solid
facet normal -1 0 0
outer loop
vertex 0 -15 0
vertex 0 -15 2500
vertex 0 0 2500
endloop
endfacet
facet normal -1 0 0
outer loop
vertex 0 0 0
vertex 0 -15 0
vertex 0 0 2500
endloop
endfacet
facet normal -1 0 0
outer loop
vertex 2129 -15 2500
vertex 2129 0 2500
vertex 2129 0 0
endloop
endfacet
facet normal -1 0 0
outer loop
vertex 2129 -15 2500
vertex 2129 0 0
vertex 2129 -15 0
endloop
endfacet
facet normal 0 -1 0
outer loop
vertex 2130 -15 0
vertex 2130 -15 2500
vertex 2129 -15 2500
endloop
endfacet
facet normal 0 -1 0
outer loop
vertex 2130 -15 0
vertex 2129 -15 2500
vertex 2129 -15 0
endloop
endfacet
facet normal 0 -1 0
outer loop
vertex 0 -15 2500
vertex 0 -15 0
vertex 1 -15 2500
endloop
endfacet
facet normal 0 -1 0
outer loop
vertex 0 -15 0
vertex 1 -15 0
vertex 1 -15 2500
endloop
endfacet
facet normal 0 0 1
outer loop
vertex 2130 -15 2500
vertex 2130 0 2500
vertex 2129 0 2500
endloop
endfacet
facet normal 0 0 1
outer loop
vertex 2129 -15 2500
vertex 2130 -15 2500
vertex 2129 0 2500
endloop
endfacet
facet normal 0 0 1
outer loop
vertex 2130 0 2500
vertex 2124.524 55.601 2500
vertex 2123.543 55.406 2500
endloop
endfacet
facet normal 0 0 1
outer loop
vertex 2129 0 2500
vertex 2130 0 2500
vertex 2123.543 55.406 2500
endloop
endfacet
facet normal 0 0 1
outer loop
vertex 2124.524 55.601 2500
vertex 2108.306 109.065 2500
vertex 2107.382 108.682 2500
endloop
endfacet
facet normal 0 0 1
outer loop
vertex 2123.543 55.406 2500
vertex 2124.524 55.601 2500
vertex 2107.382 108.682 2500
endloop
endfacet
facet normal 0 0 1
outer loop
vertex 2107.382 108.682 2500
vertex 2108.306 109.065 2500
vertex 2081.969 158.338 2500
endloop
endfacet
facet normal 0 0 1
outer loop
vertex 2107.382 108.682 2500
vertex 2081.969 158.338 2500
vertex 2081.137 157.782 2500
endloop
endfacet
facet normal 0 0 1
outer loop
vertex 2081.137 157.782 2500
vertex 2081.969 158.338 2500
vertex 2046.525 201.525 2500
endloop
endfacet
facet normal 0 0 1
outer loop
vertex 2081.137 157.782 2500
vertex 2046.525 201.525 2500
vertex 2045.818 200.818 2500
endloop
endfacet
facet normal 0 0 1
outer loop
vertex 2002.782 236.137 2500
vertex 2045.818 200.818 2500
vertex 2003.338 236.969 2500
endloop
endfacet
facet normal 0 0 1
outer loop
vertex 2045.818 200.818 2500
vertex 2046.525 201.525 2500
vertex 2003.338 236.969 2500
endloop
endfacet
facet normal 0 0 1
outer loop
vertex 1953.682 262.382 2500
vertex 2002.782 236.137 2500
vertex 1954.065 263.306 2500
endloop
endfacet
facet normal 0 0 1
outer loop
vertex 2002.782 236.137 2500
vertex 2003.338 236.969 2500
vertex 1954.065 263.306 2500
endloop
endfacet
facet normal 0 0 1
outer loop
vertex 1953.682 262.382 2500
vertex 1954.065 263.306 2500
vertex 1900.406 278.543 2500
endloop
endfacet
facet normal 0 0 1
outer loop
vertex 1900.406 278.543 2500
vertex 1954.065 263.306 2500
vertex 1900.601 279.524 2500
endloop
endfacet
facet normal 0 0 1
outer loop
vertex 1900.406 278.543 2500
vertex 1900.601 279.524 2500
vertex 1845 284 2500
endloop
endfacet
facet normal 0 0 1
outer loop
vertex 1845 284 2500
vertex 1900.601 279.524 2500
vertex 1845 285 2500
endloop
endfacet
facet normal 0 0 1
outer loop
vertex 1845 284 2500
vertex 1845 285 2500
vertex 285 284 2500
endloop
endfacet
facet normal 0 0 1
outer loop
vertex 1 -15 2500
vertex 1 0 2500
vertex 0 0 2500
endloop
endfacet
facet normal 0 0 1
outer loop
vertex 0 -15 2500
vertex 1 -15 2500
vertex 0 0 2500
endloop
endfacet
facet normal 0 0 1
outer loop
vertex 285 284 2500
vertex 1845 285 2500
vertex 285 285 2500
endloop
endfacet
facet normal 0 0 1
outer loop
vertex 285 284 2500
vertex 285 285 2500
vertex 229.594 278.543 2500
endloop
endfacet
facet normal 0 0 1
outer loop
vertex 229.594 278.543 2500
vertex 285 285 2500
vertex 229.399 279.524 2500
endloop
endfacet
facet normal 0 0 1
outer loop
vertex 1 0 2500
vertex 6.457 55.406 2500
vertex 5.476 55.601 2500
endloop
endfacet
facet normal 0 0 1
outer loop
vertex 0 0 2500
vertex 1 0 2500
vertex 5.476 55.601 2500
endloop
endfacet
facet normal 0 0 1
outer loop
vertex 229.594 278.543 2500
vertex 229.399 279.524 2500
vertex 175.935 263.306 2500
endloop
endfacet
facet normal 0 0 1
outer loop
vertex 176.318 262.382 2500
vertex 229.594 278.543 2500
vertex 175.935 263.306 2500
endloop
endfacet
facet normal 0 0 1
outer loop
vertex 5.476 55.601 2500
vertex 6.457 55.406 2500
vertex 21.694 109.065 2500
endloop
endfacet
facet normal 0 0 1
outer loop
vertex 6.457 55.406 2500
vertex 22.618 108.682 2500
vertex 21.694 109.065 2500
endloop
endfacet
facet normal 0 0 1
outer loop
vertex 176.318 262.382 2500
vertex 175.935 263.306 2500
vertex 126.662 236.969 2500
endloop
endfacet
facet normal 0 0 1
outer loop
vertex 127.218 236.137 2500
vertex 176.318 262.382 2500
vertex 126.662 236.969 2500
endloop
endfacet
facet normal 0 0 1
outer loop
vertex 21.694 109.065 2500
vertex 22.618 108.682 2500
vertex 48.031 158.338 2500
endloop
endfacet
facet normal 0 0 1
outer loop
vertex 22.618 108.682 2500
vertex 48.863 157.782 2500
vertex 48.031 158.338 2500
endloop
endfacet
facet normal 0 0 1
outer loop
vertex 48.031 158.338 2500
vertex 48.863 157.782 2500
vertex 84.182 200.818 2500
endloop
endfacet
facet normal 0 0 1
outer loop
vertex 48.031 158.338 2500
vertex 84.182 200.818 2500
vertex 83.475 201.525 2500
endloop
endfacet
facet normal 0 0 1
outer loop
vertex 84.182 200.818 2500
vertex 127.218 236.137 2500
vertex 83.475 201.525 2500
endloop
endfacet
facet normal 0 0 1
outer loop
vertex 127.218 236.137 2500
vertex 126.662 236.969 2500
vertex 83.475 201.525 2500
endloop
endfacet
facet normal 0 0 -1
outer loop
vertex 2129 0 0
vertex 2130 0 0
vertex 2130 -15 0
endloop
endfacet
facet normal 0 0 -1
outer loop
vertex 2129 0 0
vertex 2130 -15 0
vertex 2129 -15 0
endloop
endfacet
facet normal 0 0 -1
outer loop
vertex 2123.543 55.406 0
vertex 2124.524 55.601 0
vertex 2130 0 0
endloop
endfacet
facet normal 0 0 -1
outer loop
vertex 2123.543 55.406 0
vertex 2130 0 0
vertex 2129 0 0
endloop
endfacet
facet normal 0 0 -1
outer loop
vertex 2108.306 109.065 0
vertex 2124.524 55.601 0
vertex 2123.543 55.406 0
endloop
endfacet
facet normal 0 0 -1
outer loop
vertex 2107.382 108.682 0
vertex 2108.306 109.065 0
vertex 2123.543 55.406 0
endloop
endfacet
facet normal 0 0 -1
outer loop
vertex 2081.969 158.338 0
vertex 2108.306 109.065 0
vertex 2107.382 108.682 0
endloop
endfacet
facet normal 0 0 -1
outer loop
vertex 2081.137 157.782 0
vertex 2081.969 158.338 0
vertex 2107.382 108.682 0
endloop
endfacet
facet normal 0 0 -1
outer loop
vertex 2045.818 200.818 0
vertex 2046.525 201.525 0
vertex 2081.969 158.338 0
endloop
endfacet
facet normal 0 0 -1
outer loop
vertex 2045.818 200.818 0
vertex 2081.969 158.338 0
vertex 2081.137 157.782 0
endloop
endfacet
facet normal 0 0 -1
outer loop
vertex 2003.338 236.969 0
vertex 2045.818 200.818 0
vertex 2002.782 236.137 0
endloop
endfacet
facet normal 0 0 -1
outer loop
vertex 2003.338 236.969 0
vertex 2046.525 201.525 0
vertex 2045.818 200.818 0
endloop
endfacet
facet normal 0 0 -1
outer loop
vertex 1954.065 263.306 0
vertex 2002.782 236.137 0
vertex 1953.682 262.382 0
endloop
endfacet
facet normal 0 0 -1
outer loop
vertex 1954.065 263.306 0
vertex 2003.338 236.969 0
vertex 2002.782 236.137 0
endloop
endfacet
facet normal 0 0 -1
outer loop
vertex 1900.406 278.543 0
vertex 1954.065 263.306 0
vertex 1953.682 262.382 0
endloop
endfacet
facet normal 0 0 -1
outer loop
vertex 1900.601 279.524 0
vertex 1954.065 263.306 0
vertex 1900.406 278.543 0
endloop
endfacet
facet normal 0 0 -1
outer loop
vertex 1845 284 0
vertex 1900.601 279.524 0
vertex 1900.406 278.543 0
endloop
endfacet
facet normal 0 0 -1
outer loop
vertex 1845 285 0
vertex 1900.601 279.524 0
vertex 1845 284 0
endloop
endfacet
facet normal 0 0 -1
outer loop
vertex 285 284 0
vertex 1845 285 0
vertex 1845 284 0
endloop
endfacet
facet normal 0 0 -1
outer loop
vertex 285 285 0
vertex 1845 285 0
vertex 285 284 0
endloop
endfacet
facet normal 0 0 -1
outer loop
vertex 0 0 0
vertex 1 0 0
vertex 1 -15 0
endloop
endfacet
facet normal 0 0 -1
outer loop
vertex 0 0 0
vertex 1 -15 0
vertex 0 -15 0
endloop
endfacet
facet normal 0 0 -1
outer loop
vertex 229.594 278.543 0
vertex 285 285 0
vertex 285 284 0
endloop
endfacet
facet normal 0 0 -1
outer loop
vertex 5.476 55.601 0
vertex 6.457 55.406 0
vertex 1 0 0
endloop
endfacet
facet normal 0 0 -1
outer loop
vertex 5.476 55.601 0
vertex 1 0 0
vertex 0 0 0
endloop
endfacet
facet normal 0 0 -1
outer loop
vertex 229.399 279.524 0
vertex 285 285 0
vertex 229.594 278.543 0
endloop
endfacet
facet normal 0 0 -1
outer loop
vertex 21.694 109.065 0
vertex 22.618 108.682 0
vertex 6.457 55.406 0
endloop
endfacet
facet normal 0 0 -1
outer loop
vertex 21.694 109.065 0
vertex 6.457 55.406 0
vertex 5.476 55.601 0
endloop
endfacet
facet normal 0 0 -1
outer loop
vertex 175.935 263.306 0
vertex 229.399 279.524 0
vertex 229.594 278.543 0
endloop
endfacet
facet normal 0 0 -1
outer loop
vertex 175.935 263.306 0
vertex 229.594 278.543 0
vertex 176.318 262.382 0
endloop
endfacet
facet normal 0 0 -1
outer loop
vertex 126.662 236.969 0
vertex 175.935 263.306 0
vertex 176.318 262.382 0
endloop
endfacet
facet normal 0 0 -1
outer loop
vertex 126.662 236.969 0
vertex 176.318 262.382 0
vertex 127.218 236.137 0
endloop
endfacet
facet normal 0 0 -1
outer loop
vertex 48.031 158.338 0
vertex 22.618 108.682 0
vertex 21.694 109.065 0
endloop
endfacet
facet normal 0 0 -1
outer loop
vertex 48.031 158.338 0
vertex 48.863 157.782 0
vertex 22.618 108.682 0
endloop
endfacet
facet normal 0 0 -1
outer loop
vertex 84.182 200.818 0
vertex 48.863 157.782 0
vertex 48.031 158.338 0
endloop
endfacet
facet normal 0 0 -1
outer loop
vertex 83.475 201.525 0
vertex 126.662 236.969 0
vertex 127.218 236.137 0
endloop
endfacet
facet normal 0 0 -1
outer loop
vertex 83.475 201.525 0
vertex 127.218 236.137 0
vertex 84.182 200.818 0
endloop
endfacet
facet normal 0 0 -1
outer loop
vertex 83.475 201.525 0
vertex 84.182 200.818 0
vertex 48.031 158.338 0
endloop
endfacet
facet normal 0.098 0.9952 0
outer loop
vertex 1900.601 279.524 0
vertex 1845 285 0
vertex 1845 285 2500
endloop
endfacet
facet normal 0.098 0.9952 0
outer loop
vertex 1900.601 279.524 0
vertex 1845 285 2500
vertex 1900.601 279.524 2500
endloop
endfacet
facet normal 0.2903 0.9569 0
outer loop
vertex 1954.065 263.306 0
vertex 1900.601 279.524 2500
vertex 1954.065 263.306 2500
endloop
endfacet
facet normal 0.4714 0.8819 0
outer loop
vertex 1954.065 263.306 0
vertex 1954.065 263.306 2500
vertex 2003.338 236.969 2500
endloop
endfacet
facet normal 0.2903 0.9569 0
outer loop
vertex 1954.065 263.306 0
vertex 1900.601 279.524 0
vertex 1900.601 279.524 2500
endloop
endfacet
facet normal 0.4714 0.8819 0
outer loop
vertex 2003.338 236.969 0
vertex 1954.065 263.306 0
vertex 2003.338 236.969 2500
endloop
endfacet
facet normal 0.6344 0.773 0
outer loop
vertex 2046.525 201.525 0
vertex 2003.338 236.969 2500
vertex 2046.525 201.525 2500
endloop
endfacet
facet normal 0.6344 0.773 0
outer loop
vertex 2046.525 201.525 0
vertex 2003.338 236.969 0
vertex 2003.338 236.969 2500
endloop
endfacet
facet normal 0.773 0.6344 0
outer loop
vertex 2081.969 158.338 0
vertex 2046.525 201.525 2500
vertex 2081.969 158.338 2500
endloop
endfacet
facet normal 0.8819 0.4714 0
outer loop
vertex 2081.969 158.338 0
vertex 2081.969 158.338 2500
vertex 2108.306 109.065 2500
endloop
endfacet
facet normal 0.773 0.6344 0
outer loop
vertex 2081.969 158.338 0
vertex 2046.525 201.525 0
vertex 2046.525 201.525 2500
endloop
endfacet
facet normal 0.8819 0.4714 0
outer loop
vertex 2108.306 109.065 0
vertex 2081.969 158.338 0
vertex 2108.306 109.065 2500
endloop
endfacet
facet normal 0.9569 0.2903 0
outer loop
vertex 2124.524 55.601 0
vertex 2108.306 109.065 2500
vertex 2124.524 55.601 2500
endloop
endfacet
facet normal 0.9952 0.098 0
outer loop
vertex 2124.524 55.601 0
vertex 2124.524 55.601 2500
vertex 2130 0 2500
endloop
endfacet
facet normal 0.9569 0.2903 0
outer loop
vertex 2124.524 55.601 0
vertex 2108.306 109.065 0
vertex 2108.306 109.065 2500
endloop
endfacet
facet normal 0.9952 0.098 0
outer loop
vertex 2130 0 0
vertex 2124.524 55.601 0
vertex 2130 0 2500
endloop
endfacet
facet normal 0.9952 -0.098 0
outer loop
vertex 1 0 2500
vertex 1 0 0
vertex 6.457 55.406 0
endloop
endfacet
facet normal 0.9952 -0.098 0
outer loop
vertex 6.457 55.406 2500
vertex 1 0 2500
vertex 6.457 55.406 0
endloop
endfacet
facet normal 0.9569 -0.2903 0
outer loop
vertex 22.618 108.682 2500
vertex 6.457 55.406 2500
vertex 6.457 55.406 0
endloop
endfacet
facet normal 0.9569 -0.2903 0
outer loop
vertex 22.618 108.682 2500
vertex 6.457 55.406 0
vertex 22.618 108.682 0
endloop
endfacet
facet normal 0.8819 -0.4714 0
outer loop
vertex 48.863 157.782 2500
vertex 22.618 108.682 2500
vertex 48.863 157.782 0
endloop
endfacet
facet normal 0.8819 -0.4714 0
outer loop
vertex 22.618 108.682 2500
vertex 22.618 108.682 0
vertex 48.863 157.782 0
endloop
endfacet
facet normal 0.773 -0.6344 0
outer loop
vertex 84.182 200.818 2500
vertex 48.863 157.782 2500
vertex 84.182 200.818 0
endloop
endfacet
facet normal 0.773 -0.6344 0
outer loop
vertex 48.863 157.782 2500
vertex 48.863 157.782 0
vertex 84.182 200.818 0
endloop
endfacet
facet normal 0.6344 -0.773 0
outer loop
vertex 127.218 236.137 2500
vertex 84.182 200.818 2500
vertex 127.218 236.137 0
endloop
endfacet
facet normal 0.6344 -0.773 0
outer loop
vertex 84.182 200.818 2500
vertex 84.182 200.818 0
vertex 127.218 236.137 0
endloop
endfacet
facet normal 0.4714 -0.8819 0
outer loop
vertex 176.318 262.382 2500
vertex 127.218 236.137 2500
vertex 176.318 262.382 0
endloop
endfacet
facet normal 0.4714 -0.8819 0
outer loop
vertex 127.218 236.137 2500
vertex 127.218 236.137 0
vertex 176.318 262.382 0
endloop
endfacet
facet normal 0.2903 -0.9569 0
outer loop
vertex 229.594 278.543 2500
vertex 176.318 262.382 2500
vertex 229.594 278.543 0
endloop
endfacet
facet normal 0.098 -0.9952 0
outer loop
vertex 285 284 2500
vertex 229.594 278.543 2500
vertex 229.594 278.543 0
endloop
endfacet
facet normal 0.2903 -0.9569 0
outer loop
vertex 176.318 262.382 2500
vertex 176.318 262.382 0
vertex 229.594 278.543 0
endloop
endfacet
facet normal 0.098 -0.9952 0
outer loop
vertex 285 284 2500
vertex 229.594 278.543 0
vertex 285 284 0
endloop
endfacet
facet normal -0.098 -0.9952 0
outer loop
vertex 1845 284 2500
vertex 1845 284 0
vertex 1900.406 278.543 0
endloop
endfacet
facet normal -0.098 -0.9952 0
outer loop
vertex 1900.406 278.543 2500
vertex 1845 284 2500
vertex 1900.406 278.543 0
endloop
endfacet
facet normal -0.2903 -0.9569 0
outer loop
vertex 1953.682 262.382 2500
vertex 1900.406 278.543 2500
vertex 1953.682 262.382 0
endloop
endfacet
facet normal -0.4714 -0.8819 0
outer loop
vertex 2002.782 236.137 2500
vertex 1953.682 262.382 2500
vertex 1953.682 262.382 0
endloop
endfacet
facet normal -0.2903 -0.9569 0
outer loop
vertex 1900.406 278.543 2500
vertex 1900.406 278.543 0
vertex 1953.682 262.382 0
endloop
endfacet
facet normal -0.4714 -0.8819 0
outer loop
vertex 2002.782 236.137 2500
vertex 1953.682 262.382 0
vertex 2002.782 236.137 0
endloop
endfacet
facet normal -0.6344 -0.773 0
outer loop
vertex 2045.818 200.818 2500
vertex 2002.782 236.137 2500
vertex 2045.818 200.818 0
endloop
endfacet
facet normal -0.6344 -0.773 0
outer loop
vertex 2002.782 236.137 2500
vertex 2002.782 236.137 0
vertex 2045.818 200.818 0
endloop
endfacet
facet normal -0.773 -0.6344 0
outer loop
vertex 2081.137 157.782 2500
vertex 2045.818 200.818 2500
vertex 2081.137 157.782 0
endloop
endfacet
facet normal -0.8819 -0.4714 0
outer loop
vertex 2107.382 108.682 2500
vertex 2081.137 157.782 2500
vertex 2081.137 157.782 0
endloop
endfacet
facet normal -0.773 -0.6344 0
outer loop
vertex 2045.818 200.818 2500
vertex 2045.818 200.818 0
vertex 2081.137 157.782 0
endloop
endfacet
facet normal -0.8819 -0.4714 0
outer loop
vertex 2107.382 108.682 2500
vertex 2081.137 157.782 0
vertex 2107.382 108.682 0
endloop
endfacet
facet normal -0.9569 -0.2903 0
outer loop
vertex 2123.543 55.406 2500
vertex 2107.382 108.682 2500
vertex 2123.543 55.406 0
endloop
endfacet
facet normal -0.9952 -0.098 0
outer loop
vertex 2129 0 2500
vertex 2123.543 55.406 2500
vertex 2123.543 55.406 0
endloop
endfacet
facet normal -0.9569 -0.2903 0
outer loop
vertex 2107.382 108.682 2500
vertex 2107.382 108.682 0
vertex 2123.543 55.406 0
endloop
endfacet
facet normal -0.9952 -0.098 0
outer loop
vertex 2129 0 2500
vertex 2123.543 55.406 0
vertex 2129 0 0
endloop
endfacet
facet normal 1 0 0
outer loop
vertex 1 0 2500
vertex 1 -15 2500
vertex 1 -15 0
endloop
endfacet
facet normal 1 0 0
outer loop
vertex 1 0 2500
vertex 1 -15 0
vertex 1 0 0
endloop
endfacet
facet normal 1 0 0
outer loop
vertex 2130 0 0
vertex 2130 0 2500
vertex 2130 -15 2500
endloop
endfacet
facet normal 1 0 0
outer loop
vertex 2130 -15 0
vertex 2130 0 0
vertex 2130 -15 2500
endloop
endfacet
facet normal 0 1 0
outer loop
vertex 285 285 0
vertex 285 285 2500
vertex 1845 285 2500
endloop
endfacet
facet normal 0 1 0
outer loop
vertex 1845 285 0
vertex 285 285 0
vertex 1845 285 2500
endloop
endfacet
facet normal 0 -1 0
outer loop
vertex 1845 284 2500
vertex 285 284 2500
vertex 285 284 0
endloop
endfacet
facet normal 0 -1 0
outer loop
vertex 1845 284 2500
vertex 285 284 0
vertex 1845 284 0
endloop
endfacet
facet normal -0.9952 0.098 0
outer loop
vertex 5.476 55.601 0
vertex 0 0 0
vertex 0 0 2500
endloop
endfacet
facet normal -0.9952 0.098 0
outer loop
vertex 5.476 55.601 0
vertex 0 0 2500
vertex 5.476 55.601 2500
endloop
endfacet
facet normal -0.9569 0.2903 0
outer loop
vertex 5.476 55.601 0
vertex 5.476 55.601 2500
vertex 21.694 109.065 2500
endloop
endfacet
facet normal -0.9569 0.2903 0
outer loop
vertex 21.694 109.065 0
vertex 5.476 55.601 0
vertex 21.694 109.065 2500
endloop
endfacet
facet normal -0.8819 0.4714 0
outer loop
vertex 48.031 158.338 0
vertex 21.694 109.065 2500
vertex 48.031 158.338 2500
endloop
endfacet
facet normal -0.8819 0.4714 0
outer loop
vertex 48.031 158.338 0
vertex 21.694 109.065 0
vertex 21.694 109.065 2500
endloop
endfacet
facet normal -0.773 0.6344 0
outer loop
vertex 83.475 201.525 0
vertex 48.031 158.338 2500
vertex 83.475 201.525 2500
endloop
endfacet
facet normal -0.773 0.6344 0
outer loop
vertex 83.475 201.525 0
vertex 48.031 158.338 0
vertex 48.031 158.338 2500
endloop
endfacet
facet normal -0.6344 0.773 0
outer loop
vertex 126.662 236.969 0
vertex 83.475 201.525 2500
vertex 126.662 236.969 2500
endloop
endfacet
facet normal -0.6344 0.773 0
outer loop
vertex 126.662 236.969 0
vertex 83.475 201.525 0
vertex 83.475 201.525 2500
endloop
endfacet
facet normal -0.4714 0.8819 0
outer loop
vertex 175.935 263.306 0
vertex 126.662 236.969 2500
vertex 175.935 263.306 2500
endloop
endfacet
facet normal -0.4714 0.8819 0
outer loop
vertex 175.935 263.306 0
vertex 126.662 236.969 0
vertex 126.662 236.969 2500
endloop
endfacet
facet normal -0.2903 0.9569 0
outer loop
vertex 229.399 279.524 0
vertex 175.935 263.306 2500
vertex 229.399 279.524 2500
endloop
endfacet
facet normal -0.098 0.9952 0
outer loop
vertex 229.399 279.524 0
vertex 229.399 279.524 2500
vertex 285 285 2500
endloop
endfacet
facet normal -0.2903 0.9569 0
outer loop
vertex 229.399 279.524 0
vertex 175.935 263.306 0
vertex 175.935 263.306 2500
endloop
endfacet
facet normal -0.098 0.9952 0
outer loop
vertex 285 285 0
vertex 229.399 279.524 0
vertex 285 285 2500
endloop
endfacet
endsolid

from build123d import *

# Parameters (mm, degrees)
SURFACE_EXTRUDE2_1_DEPTH = 2500
THICKEN1_T2              = 1


with BuildPart() as body_1:
    # Surface-Extrude2: a surface, the sketch's curves swept straight by 2500 mm
    with BuildLine(Plane.XY, mode=Mode.PRIVATE) as surface_extrude2_1_path:
        Line((0, -15), (0, 0))
        ThreePointArc((0, 0), (83.474567362, 201.525432638), (285, 285))
        Line((285, 285), (1845, 285))
        ThreePointArc((1845, 285), (2046.525432638, 201.525432638), (2130, 0))
        Line((2130, 0), (2130, -15))
    surface_extrude2_1 = Shell.extrude(surface_extrude2_1_path.wire(), (0 * SURFACE_EXTRUDE2_1_DEPTH, 0 * SURFACE_EXTRUDE2_1_DEPTH, 1 * SURFACE_EXTRUDE2_1_DEPTH))
    add(Solid.thicken(surface_extrude2_1, -THICKEN1_T2))


solid = body_1.part
